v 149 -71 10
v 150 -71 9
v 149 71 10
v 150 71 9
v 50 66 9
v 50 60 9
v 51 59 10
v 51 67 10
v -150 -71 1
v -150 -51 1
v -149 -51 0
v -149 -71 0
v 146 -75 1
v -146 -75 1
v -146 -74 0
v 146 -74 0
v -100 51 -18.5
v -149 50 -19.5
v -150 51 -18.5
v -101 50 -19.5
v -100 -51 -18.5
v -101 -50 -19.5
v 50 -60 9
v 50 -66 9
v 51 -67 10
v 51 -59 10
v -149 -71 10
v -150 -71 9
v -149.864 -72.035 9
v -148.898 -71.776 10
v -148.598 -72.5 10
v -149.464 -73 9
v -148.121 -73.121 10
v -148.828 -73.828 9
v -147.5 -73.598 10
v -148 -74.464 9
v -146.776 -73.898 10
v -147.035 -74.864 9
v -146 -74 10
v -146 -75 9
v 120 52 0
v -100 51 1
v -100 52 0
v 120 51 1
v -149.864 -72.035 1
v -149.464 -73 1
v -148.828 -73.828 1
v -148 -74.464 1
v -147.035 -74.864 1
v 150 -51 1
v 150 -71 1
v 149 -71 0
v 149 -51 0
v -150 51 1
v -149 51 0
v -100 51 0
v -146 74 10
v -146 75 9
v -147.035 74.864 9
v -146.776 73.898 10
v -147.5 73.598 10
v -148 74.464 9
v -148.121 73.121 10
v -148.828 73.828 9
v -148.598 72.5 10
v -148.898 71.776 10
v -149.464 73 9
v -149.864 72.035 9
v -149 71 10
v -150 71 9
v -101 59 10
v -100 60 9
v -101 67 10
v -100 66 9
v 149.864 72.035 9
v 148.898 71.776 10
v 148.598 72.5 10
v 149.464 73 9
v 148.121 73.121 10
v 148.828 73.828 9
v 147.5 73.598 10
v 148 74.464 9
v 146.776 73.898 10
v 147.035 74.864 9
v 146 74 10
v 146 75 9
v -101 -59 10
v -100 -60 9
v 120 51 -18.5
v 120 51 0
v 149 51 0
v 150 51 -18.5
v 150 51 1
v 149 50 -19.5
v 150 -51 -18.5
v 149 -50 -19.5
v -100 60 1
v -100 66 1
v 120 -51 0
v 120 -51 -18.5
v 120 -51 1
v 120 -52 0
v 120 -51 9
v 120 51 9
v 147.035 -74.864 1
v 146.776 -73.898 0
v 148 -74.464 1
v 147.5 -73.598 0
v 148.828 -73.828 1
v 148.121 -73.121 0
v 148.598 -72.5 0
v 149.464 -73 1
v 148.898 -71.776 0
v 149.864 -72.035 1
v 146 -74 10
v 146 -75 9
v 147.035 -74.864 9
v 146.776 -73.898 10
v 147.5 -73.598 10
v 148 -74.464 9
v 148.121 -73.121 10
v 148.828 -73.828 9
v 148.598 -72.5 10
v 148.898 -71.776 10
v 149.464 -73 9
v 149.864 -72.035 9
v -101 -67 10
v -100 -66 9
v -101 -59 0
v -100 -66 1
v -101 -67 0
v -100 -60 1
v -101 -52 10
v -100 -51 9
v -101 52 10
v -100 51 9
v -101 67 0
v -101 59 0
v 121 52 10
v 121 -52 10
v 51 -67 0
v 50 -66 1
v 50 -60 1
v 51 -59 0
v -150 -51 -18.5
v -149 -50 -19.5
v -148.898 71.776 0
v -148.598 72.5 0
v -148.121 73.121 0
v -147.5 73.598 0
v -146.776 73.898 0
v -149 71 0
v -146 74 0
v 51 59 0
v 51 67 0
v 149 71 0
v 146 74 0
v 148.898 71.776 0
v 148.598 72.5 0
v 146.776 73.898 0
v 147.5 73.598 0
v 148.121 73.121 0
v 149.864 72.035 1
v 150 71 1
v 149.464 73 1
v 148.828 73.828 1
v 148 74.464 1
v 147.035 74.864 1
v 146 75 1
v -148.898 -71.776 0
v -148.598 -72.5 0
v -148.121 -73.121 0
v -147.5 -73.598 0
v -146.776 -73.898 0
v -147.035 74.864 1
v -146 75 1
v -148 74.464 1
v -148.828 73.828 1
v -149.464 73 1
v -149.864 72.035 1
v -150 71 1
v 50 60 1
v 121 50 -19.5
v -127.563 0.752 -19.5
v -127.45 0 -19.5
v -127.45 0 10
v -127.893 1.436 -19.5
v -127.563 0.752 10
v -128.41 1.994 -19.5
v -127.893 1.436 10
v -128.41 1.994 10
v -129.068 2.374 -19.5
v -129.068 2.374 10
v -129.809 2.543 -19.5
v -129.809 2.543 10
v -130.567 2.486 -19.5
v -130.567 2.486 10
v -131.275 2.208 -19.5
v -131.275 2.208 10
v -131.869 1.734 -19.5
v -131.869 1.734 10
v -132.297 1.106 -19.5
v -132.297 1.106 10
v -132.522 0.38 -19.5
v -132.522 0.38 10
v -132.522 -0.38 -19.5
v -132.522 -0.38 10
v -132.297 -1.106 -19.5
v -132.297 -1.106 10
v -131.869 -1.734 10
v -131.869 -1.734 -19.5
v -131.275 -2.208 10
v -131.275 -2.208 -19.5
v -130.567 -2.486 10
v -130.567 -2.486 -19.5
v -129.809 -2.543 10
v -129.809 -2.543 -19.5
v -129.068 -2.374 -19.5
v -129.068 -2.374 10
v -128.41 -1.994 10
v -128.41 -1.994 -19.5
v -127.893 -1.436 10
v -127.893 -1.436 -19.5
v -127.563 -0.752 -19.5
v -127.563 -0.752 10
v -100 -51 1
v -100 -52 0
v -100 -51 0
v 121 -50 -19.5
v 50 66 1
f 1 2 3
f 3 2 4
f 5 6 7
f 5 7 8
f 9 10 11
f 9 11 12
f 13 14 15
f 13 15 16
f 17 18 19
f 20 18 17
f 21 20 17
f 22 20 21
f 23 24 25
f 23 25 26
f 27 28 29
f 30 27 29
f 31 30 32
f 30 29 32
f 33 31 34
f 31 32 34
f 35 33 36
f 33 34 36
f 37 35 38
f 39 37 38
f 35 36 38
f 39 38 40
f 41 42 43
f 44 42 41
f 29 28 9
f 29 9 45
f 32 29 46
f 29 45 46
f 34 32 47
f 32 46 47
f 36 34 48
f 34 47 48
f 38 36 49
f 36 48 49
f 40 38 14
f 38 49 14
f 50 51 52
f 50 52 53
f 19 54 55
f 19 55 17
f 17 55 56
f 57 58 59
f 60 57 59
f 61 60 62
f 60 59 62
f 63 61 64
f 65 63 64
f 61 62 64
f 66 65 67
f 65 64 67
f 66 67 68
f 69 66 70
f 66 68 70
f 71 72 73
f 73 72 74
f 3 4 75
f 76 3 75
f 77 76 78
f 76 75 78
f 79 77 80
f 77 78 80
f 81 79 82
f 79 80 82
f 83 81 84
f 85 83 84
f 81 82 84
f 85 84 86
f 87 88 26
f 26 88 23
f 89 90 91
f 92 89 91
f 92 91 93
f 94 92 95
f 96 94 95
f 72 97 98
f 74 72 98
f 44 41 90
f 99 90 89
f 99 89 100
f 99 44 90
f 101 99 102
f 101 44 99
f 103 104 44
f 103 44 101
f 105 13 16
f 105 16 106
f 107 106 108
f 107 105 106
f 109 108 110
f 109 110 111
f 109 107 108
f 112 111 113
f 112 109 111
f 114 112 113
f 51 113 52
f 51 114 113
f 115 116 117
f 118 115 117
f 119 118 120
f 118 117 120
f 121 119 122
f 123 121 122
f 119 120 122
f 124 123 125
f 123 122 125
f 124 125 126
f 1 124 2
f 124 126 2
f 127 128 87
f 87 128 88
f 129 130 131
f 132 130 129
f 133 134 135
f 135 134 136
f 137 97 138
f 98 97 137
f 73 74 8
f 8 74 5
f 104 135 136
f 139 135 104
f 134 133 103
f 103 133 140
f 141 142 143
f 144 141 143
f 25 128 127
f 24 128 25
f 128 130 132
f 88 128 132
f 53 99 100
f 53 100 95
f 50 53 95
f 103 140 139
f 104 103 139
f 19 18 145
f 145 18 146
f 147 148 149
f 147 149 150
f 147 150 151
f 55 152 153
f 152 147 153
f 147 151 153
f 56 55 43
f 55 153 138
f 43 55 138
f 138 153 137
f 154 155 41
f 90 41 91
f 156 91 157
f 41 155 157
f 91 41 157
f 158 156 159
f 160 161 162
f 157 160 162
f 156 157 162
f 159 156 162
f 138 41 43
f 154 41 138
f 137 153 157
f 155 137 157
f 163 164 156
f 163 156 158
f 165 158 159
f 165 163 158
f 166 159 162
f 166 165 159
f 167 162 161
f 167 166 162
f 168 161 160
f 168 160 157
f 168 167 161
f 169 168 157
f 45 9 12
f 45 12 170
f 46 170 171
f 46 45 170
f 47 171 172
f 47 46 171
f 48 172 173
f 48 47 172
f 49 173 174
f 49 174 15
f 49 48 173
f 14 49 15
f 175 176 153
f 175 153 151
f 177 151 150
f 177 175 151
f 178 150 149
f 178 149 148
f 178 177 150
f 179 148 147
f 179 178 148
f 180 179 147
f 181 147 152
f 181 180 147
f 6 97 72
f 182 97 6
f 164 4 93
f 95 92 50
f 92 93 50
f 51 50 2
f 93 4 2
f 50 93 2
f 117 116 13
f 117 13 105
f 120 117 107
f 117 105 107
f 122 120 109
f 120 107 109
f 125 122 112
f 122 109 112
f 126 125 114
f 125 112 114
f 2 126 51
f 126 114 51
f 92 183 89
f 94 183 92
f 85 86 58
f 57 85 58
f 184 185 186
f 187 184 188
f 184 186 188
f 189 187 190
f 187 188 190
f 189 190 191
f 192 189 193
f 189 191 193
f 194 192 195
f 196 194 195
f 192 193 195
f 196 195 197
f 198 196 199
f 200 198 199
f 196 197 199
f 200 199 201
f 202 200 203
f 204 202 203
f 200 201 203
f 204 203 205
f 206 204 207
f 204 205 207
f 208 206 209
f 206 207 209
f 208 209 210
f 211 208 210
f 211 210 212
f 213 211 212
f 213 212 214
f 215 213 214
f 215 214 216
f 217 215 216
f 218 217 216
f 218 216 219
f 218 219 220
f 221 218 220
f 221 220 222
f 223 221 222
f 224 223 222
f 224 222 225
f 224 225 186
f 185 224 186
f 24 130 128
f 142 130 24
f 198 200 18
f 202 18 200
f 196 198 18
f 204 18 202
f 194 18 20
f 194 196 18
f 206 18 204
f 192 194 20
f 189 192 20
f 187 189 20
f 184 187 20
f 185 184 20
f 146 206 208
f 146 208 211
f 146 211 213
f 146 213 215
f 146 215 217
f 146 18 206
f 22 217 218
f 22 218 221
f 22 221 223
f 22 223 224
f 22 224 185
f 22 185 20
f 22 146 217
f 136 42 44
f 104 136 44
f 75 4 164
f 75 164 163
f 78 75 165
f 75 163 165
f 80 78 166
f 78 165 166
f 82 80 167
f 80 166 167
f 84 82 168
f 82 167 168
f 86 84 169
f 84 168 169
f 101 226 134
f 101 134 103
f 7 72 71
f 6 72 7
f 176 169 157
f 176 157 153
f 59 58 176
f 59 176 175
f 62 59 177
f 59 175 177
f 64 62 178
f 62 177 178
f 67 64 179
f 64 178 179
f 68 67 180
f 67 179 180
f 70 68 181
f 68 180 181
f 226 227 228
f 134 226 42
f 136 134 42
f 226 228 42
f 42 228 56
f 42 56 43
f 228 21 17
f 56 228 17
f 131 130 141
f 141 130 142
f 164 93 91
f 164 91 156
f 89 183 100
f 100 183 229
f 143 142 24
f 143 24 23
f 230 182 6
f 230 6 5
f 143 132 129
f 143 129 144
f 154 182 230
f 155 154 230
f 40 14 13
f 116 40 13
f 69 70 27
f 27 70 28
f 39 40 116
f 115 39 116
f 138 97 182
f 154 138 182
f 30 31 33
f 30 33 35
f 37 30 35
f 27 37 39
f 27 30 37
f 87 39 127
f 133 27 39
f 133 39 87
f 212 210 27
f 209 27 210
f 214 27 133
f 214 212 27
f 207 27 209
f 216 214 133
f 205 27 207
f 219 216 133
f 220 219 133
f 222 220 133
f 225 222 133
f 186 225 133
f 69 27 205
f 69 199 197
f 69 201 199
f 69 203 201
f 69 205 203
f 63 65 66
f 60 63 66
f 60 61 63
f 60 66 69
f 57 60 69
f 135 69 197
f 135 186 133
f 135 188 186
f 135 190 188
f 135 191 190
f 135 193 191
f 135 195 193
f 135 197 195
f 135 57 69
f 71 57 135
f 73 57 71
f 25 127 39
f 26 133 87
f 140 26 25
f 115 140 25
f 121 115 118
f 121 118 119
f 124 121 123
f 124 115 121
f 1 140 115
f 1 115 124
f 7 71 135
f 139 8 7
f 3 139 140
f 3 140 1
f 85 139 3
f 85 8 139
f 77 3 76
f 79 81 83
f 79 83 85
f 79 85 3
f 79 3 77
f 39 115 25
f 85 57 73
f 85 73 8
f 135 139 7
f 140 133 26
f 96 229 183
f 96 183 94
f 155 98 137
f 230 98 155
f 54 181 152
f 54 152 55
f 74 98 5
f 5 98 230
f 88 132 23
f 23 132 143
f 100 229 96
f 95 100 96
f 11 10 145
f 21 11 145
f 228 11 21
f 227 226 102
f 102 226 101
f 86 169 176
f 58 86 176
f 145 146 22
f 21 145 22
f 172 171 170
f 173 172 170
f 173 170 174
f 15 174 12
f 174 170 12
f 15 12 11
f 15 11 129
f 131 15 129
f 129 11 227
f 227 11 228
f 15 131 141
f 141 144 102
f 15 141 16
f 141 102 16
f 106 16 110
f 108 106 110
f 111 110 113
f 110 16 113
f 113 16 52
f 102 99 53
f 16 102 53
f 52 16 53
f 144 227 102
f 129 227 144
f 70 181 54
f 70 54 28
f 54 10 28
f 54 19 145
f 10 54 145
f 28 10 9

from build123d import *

# Parameters (mm, degrees)
SKETCH010_W     = 220
SKETCH010_H     = 102
SKETCH010_W_2   = 150
SKETCH010_H_2   = 6
PAD006_DEPTH    = 10
SKETCH012_W     = 30
SKETCH012_H     = 102
SKETCH012_W_2   = 50
PAD007_DEPTH    = 19.5
CHAMFER001_SIZE = 1
SKETCH_R        = 2.55
HOLE_DEPTH      = 29.501


with BuildPart() as part:
    # Sketch010 → Pad006 (new body)
    with BuildSketch(Plane.XY):
        with BuildLine():
            Line((-150, 71), (-150, -71))
            ThreePointArc((-150, -71), (-148.828427, -73.828427), (-146, -75))
            Line((-146, -75), (146, -75))
            ThreePointArc((146, -75), (148.828427, -73.828427), (150, -71))
            Line((150, -71), (150, 71))
            ThreePointArc((150, 71), (148.828427, 73.828427), (146, 75))
            Line((146, 75), (-146, 75))
            ThreePointArc((-146, 75), (-148.828427, 73.828427), (-150, 71))
        make_face()
        with Locations((10, 0)):
            Rectangle(SKETCH010_W, SKETCH010_H, mode=Mode.SUBTRACT)
        with Locations((-25, 63)):
            Rectangle(SKETCH010_W_2, SKETCH010_H_2, mode=Mode.SUBTRACT)
        with Locations((-25, -63)):
            Rectangle(SKETCH010_W_2, SKETCH010_H_2, mode=Mode.SUBTRACT)
    extrude(amount=PAD006_DEPTH)

    # Sketch012 (on Face21 of Pad006) → Pad007 (join)
    with BuildSketch(Plane(origin=(0, 0, 0), x_dir=(1, 0, 0), z_dir=(0, 0, -1))):
        with Locations((135, 0)):
            Rectangle(SKETCH012_W, SKETCH012_H)
        with Locations((-125, 0)):
            Rectangle(SKETCH012_W_2, SKETCH012_H)
    extrude(amount=PAD007_DEPTH)

    # Chamfer001
    chamfer001_edges = [part.edges().sort_by_distance(p)[0] for p in [
        (-25, -66, 0),
        (-100, -63, 0),
        (-25, -60, 0),
        (50, -63, 0),
        (50, 63, 0),
        (-25, 66, 0),
        (-25, 60, 0),
        (-100, 63, 0),
        (-150, 0, -19.5),
        (-125, 51, -19.5),
        (-100, 0, -19.5),
        (-125, -51, -19.5),
        (120, 0, -19.5),
        (135, 51, -19.5),
        (150, 0, -19.5),
        (135, -51, -19.5),
        (0, -75, 0),
        (0, 75, 0),
        (10, -51, 0),
        (10, 51, 0),
        (-150, 0, 10),
        (-148.828427, -73.828427, 10),
        (0, -75, 10),
        (148.828427, -73.828427, 10),
        (150, 0, 10),
        (148.828427, 73.828427, 10),
        (0, 75, 10),
        (-148.828427, 73.828427, 10),
        (-100, 0, 10),
        (10, -51, 10),
        (120, 0, 10),
        (10, 51, 10),
        (-100, -63, 10),
        (-25, -66, 10),
        (50, -63, 10),
        (-25, -60, 10),
        (-100, 63, 10),
        (-25, 60, 10),
        (50, 63, 10),
        (-25, 66, 10),
    ]]
    chamfer(chamfer001_edges, length=CHAMFER001_SIZE)

    # Sketch (on Face15 of Chamfer001) → Hole (cut, through all)
    with BuildSketch(Plane.XY.offset(10)):
        with Locations((-130, 0)):
            Circle(SKETCH_R)
    extrude(amount=-HOLE_DEPTH, mode=Mode.SUBTRACT)


solid = part.part
